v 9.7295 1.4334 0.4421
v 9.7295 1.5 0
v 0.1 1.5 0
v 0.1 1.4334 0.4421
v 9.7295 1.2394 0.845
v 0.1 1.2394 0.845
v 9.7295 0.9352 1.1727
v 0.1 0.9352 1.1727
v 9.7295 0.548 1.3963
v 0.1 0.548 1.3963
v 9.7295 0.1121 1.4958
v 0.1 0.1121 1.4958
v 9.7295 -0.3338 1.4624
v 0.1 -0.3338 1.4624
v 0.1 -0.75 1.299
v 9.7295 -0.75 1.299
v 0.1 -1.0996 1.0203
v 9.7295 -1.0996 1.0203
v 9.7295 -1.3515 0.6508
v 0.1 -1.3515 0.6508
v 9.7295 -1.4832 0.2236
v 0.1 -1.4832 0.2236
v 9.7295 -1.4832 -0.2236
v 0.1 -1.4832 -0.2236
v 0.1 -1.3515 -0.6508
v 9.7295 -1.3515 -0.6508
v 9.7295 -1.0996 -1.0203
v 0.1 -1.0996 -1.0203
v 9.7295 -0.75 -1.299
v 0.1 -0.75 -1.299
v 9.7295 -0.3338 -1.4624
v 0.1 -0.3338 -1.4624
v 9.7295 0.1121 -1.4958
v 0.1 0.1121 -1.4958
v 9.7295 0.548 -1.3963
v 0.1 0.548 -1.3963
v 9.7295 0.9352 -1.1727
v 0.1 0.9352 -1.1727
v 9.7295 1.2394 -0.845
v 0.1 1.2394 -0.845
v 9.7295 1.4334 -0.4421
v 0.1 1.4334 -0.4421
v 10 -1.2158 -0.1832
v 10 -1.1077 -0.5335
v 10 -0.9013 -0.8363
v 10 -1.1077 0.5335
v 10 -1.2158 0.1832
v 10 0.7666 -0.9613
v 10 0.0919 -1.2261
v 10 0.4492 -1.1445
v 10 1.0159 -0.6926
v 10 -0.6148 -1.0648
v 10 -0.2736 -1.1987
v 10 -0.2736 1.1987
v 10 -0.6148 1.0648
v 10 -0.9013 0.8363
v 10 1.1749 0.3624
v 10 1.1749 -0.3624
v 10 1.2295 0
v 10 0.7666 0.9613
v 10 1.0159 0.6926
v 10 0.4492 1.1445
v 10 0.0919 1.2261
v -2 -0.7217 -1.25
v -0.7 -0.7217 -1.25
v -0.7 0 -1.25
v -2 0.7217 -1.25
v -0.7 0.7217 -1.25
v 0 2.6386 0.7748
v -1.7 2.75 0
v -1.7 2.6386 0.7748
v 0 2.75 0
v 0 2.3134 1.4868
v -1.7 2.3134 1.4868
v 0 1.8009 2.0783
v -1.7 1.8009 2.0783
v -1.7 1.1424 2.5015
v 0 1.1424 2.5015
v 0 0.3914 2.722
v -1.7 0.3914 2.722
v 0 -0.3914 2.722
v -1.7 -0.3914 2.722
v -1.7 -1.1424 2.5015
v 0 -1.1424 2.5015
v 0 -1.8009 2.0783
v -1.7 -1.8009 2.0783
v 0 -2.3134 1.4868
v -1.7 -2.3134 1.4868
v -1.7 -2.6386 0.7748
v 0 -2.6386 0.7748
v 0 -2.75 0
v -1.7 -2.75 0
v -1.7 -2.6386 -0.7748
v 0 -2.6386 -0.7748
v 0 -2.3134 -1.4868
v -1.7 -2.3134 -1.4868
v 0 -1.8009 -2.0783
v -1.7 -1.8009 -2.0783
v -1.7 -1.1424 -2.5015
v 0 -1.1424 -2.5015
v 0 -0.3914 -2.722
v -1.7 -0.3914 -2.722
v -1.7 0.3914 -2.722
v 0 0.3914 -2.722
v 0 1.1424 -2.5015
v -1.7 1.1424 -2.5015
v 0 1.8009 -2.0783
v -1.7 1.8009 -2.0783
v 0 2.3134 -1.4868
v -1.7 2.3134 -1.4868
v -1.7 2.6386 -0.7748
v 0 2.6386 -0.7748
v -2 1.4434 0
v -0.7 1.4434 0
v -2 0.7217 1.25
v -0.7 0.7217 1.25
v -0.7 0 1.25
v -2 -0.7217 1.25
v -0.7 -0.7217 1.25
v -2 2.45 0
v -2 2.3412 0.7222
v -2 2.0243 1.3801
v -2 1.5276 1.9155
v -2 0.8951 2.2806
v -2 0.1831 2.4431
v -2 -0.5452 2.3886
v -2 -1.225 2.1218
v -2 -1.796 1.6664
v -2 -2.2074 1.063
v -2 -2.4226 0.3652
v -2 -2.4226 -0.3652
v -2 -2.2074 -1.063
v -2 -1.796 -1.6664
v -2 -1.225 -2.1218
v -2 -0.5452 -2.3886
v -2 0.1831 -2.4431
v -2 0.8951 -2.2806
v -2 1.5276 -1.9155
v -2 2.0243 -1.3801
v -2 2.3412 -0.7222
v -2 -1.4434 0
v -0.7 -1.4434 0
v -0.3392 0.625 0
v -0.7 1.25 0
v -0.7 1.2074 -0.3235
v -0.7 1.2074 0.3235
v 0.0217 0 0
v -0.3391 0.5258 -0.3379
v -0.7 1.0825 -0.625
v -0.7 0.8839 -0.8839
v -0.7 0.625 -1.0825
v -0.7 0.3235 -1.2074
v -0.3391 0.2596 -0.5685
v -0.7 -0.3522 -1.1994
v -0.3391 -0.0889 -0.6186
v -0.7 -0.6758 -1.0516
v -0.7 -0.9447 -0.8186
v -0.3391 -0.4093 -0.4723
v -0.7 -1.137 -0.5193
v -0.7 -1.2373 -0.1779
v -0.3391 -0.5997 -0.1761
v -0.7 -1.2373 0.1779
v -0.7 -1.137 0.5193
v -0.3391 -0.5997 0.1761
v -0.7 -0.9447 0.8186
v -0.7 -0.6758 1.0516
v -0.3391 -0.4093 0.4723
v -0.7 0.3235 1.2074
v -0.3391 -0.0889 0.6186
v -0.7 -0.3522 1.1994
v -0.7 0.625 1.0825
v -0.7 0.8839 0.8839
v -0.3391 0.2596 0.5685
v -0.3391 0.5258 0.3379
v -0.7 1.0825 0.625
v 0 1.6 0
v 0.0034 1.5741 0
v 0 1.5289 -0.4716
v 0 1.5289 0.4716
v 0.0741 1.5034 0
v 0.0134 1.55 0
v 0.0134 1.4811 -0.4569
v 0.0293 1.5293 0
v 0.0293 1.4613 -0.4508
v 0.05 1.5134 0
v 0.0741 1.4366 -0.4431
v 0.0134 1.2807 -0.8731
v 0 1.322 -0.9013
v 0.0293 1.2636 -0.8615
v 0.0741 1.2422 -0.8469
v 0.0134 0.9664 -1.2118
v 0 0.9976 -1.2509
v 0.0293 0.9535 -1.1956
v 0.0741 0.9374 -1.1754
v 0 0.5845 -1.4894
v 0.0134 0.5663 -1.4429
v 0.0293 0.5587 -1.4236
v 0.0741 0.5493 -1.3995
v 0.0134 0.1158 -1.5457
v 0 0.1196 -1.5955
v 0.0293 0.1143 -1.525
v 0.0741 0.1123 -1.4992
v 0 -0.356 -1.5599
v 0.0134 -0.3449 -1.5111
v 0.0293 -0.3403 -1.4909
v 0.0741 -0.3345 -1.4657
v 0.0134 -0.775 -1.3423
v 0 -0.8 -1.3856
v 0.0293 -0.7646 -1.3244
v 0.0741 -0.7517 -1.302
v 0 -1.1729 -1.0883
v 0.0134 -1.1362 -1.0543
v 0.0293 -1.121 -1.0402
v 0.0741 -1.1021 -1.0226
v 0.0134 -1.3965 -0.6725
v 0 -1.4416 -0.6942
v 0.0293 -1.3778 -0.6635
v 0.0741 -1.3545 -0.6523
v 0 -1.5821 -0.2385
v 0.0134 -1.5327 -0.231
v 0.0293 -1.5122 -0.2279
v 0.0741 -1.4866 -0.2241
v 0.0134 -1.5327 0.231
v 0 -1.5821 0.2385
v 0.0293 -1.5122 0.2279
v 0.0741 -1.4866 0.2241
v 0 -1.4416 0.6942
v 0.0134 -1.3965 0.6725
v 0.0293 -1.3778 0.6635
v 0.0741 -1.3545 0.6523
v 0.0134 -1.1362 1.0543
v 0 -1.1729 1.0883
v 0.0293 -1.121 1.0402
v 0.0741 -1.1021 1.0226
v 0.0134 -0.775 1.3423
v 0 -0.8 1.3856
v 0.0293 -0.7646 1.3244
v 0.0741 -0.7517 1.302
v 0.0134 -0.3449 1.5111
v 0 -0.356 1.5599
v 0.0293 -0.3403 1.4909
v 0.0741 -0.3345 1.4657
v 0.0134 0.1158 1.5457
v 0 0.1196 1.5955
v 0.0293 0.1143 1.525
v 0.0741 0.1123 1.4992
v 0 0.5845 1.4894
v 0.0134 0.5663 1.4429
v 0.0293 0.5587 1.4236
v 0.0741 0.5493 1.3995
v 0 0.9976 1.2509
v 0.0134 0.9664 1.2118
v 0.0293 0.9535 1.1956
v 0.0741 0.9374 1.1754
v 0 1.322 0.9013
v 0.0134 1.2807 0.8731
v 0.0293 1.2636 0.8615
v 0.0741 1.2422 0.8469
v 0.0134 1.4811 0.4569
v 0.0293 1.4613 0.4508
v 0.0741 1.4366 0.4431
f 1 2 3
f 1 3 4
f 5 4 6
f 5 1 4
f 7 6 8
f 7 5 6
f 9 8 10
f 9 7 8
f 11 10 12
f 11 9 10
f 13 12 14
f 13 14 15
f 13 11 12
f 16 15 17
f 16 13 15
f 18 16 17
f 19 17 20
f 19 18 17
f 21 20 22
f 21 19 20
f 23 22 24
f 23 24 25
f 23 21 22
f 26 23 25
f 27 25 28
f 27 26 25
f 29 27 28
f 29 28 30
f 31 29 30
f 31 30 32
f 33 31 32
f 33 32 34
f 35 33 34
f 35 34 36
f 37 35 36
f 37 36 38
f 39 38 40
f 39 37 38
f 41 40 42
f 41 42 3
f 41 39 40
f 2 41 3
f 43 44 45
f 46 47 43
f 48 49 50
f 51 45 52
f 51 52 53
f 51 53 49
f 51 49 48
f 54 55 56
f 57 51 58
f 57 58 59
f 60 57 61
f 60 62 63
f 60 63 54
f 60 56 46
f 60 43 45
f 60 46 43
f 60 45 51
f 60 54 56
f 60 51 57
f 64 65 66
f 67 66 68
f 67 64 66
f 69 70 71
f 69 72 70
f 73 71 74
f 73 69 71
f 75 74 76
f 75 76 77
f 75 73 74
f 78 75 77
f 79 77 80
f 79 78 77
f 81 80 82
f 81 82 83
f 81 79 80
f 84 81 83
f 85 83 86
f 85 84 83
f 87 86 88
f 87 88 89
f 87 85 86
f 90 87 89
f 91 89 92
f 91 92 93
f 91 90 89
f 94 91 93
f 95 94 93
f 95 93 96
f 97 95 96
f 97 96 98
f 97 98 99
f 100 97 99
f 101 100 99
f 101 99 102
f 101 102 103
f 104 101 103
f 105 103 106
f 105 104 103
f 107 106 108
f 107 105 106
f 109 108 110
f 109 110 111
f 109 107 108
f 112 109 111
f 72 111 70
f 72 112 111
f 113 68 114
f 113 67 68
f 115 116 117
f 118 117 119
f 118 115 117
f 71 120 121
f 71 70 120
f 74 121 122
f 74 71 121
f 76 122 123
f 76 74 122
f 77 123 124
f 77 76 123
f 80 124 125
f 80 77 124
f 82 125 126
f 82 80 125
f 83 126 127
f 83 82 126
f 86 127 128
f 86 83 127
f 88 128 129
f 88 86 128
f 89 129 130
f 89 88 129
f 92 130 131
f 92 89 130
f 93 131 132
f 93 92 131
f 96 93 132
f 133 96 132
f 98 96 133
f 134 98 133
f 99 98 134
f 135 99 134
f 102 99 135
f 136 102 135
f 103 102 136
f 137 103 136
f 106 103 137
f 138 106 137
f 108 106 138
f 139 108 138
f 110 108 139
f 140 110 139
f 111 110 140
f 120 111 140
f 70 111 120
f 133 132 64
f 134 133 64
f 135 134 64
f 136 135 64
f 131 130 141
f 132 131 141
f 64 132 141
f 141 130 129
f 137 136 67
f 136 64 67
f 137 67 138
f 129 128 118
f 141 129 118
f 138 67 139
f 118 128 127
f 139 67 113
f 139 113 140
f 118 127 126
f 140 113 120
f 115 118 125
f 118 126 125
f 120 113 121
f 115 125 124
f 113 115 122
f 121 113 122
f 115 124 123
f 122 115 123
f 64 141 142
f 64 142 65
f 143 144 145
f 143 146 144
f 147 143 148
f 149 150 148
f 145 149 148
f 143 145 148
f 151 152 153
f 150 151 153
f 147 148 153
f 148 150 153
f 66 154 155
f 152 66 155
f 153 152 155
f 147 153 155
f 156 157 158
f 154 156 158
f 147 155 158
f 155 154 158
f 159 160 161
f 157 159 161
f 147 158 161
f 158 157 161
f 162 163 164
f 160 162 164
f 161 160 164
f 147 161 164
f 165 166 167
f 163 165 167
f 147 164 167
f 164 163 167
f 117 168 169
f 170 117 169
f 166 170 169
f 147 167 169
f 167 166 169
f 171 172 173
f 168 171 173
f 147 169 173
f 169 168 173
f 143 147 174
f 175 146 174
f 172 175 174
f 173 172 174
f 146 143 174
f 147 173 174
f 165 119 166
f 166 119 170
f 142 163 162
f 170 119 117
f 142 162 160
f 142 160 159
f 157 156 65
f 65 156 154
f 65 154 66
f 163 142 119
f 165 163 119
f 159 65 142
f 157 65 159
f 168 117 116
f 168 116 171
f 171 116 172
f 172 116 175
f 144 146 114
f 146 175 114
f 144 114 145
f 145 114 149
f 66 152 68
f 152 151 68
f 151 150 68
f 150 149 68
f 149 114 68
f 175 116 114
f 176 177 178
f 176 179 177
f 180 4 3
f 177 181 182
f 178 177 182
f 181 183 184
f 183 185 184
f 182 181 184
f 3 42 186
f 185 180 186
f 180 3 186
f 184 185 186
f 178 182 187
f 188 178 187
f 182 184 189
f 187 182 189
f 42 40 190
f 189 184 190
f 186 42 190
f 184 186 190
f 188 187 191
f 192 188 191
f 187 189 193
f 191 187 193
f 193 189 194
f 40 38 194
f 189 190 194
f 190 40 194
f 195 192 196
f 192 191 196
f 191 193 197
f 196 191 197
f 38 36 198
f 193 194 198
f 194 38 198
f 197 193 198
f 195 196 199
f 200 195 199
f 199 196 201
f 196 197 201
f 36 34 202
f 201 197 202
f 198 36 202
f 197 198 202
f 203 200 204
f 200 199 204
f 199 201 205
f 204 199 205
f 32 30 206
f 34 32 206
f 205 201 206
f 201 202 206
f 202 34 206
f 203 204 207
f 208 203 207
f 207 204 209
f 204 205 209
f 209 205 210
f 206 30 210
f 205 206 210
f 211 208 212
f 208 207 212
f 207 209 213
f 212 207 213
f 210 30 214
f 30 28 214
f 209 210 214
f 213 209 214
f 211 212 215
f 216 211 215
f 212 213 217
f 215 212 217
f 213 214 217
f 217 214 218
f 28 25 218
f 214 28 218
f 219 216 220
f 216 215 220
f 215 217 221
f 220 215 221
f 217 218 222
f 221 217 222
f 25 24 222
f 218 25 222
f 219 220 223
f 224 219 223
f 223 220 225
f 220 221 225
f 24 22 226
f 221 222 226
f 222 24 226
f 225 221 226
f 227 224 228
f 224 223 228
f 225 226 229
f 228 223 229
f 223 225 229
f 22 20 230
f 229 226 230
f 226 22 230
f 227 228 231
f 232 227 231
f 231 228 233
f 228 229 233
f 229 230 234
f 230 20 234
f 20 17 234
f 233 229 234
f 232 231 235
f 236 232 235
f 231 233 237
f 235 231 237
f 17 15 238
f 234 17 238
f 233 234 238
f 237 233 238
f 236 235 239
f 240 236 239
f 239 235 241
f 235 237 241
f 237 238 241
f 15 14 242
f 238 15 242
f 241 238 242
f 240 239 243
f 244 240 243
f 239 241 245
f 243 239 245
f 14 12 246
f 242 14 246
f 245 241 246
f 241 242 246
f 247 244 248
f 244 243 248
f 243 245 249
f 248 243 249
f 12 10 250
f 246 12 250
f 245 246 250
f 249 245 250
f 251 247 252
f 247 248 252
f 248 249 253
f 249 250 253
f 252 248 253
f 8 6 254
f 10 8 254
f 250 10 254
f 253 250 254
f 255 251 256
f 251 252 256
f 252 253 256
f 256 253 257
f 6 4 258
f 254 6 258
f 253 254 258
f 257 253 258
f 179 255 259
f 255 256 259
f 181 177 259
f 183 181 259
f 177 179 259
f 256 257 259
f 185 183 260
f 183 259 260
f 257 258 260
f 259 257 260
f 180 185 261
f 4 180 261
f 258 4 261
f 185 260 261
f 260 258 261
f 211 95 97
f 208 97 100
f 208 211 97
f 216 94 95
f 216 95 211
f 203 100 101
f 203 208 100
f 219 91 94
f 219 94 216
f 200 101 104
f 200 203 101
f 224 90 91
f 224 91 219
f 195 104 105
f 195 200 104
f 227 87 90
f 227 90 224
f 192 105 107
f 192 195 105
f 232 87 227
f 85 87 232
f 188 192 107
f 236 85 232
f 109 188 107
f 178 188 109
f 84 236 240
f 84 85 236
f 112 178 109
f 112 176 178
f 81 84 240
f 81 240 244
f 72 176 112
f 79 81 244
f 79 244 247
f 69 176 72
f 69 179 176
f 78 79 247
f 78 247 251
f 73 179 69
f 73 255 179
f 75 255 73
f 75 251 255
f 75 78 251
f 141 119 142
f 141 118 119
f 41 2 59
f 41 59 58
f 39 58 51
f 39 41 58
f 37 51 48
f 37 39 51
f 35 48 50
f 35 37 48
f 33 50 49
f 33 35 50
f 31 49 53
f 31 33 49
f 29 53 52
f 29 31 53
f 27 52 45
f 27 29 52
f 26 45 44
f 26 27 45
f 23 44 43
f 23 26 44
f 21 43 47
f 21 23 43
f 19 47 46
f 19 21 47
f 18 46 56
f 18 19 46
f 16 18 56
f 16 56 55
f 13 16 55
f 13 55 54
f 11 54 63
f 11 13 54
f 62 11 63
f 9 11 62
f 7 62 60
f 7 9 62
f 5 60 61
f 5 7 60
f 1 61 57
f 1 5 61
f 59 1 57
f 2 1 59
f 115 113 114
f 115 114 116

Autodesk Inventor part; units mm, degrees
sketch "Sketch_1" plane through (0, 0, 0) normal (0, 0, 1) x (1, 0, 0)
  line L0 (10, 0) -> (-2, 0)
  line L1 (-2, 0) -> (-2, 2.45)
  line L2 (-2, 2.45) -> (-1.7, 2.75)
  line L3 (-1.7, 2.75) -> (0, 2.75)
  line L4 (0, 2.75) -> (0, 1.6)
  arc A0 (0, 1.6) -> (0.1, 1.5) centre (0.1, 1.6) ccw
  line L5 (0.1, 1.5) -> (9.7295, 1.5)
  line L6 (9.7295, 1.5) -> (10, 1.2295)
  line L7 (10, 1.2295) -> (10, 0)
  line L8 (10, 0) -> (-2, 0)
revolve "Revolution1" add sketch "Sketch_1" angle 360 about axis through (10, 0, 0) along (1, 0, 0)
thread "Thread1" size "M3x0.5" class "6g" standard "ISO Metric profile" length 9.4315 offset 0.4685
sketch "Sketch_2" plane through (-2, 0, 0) normal (1, 0, 0) x (0, 0, -1)
  line L0 (-1.25, 0.7217) -> (-1.25, -0.7217)
  line L1 (-1.25, -0.7217) -> (0, -1.4434)
  line L2 (0, -1.4434) -> (1.25, -0.7217)
  line L3 (1.25, -0.7217) -> (1.25, 0.7217)
  line L4 (1.25, 0.7217) -> (0, 1.4434)
  line L5 (0, 1.4434) -> (-1.25, 0.7217)
extrude "Extrusion1" cut sketch "Sketch_2" along normal blind 1.3
sketch "Sketch_5" plane through (0, 0, 0) normal (0, 0, 1) x (1, 0, 0)
  line L0 (0.0217, 0) -> (-0.7, 0)
  line L1 (-0.7, 0) -> (-0.7, 1.25)
  line L2 (-0.7, 1.25) -> (0.0217, 0)
  line L3 (0.0217, 0) -> (-0.7, 0)
revolve "Revolution2" cut sketch "Sketch_5" angle 360 about axis through (0.0217, 0, 0) along (1, 0, 0)
ref_plane "SCW_XY" through (0, 0, 0) normal (1, 0, 0) x (0, 0, -1)
ref_plane "SCW_YZ" through (0, 0, 0) normal (0, 0, -1) x (0, 1, 0)
ref_plane "SCW_ZX" through (0, 0, 0) normal (0, 1, 0) x (1, 0, 0)
properties part number "M3-10_bo"
